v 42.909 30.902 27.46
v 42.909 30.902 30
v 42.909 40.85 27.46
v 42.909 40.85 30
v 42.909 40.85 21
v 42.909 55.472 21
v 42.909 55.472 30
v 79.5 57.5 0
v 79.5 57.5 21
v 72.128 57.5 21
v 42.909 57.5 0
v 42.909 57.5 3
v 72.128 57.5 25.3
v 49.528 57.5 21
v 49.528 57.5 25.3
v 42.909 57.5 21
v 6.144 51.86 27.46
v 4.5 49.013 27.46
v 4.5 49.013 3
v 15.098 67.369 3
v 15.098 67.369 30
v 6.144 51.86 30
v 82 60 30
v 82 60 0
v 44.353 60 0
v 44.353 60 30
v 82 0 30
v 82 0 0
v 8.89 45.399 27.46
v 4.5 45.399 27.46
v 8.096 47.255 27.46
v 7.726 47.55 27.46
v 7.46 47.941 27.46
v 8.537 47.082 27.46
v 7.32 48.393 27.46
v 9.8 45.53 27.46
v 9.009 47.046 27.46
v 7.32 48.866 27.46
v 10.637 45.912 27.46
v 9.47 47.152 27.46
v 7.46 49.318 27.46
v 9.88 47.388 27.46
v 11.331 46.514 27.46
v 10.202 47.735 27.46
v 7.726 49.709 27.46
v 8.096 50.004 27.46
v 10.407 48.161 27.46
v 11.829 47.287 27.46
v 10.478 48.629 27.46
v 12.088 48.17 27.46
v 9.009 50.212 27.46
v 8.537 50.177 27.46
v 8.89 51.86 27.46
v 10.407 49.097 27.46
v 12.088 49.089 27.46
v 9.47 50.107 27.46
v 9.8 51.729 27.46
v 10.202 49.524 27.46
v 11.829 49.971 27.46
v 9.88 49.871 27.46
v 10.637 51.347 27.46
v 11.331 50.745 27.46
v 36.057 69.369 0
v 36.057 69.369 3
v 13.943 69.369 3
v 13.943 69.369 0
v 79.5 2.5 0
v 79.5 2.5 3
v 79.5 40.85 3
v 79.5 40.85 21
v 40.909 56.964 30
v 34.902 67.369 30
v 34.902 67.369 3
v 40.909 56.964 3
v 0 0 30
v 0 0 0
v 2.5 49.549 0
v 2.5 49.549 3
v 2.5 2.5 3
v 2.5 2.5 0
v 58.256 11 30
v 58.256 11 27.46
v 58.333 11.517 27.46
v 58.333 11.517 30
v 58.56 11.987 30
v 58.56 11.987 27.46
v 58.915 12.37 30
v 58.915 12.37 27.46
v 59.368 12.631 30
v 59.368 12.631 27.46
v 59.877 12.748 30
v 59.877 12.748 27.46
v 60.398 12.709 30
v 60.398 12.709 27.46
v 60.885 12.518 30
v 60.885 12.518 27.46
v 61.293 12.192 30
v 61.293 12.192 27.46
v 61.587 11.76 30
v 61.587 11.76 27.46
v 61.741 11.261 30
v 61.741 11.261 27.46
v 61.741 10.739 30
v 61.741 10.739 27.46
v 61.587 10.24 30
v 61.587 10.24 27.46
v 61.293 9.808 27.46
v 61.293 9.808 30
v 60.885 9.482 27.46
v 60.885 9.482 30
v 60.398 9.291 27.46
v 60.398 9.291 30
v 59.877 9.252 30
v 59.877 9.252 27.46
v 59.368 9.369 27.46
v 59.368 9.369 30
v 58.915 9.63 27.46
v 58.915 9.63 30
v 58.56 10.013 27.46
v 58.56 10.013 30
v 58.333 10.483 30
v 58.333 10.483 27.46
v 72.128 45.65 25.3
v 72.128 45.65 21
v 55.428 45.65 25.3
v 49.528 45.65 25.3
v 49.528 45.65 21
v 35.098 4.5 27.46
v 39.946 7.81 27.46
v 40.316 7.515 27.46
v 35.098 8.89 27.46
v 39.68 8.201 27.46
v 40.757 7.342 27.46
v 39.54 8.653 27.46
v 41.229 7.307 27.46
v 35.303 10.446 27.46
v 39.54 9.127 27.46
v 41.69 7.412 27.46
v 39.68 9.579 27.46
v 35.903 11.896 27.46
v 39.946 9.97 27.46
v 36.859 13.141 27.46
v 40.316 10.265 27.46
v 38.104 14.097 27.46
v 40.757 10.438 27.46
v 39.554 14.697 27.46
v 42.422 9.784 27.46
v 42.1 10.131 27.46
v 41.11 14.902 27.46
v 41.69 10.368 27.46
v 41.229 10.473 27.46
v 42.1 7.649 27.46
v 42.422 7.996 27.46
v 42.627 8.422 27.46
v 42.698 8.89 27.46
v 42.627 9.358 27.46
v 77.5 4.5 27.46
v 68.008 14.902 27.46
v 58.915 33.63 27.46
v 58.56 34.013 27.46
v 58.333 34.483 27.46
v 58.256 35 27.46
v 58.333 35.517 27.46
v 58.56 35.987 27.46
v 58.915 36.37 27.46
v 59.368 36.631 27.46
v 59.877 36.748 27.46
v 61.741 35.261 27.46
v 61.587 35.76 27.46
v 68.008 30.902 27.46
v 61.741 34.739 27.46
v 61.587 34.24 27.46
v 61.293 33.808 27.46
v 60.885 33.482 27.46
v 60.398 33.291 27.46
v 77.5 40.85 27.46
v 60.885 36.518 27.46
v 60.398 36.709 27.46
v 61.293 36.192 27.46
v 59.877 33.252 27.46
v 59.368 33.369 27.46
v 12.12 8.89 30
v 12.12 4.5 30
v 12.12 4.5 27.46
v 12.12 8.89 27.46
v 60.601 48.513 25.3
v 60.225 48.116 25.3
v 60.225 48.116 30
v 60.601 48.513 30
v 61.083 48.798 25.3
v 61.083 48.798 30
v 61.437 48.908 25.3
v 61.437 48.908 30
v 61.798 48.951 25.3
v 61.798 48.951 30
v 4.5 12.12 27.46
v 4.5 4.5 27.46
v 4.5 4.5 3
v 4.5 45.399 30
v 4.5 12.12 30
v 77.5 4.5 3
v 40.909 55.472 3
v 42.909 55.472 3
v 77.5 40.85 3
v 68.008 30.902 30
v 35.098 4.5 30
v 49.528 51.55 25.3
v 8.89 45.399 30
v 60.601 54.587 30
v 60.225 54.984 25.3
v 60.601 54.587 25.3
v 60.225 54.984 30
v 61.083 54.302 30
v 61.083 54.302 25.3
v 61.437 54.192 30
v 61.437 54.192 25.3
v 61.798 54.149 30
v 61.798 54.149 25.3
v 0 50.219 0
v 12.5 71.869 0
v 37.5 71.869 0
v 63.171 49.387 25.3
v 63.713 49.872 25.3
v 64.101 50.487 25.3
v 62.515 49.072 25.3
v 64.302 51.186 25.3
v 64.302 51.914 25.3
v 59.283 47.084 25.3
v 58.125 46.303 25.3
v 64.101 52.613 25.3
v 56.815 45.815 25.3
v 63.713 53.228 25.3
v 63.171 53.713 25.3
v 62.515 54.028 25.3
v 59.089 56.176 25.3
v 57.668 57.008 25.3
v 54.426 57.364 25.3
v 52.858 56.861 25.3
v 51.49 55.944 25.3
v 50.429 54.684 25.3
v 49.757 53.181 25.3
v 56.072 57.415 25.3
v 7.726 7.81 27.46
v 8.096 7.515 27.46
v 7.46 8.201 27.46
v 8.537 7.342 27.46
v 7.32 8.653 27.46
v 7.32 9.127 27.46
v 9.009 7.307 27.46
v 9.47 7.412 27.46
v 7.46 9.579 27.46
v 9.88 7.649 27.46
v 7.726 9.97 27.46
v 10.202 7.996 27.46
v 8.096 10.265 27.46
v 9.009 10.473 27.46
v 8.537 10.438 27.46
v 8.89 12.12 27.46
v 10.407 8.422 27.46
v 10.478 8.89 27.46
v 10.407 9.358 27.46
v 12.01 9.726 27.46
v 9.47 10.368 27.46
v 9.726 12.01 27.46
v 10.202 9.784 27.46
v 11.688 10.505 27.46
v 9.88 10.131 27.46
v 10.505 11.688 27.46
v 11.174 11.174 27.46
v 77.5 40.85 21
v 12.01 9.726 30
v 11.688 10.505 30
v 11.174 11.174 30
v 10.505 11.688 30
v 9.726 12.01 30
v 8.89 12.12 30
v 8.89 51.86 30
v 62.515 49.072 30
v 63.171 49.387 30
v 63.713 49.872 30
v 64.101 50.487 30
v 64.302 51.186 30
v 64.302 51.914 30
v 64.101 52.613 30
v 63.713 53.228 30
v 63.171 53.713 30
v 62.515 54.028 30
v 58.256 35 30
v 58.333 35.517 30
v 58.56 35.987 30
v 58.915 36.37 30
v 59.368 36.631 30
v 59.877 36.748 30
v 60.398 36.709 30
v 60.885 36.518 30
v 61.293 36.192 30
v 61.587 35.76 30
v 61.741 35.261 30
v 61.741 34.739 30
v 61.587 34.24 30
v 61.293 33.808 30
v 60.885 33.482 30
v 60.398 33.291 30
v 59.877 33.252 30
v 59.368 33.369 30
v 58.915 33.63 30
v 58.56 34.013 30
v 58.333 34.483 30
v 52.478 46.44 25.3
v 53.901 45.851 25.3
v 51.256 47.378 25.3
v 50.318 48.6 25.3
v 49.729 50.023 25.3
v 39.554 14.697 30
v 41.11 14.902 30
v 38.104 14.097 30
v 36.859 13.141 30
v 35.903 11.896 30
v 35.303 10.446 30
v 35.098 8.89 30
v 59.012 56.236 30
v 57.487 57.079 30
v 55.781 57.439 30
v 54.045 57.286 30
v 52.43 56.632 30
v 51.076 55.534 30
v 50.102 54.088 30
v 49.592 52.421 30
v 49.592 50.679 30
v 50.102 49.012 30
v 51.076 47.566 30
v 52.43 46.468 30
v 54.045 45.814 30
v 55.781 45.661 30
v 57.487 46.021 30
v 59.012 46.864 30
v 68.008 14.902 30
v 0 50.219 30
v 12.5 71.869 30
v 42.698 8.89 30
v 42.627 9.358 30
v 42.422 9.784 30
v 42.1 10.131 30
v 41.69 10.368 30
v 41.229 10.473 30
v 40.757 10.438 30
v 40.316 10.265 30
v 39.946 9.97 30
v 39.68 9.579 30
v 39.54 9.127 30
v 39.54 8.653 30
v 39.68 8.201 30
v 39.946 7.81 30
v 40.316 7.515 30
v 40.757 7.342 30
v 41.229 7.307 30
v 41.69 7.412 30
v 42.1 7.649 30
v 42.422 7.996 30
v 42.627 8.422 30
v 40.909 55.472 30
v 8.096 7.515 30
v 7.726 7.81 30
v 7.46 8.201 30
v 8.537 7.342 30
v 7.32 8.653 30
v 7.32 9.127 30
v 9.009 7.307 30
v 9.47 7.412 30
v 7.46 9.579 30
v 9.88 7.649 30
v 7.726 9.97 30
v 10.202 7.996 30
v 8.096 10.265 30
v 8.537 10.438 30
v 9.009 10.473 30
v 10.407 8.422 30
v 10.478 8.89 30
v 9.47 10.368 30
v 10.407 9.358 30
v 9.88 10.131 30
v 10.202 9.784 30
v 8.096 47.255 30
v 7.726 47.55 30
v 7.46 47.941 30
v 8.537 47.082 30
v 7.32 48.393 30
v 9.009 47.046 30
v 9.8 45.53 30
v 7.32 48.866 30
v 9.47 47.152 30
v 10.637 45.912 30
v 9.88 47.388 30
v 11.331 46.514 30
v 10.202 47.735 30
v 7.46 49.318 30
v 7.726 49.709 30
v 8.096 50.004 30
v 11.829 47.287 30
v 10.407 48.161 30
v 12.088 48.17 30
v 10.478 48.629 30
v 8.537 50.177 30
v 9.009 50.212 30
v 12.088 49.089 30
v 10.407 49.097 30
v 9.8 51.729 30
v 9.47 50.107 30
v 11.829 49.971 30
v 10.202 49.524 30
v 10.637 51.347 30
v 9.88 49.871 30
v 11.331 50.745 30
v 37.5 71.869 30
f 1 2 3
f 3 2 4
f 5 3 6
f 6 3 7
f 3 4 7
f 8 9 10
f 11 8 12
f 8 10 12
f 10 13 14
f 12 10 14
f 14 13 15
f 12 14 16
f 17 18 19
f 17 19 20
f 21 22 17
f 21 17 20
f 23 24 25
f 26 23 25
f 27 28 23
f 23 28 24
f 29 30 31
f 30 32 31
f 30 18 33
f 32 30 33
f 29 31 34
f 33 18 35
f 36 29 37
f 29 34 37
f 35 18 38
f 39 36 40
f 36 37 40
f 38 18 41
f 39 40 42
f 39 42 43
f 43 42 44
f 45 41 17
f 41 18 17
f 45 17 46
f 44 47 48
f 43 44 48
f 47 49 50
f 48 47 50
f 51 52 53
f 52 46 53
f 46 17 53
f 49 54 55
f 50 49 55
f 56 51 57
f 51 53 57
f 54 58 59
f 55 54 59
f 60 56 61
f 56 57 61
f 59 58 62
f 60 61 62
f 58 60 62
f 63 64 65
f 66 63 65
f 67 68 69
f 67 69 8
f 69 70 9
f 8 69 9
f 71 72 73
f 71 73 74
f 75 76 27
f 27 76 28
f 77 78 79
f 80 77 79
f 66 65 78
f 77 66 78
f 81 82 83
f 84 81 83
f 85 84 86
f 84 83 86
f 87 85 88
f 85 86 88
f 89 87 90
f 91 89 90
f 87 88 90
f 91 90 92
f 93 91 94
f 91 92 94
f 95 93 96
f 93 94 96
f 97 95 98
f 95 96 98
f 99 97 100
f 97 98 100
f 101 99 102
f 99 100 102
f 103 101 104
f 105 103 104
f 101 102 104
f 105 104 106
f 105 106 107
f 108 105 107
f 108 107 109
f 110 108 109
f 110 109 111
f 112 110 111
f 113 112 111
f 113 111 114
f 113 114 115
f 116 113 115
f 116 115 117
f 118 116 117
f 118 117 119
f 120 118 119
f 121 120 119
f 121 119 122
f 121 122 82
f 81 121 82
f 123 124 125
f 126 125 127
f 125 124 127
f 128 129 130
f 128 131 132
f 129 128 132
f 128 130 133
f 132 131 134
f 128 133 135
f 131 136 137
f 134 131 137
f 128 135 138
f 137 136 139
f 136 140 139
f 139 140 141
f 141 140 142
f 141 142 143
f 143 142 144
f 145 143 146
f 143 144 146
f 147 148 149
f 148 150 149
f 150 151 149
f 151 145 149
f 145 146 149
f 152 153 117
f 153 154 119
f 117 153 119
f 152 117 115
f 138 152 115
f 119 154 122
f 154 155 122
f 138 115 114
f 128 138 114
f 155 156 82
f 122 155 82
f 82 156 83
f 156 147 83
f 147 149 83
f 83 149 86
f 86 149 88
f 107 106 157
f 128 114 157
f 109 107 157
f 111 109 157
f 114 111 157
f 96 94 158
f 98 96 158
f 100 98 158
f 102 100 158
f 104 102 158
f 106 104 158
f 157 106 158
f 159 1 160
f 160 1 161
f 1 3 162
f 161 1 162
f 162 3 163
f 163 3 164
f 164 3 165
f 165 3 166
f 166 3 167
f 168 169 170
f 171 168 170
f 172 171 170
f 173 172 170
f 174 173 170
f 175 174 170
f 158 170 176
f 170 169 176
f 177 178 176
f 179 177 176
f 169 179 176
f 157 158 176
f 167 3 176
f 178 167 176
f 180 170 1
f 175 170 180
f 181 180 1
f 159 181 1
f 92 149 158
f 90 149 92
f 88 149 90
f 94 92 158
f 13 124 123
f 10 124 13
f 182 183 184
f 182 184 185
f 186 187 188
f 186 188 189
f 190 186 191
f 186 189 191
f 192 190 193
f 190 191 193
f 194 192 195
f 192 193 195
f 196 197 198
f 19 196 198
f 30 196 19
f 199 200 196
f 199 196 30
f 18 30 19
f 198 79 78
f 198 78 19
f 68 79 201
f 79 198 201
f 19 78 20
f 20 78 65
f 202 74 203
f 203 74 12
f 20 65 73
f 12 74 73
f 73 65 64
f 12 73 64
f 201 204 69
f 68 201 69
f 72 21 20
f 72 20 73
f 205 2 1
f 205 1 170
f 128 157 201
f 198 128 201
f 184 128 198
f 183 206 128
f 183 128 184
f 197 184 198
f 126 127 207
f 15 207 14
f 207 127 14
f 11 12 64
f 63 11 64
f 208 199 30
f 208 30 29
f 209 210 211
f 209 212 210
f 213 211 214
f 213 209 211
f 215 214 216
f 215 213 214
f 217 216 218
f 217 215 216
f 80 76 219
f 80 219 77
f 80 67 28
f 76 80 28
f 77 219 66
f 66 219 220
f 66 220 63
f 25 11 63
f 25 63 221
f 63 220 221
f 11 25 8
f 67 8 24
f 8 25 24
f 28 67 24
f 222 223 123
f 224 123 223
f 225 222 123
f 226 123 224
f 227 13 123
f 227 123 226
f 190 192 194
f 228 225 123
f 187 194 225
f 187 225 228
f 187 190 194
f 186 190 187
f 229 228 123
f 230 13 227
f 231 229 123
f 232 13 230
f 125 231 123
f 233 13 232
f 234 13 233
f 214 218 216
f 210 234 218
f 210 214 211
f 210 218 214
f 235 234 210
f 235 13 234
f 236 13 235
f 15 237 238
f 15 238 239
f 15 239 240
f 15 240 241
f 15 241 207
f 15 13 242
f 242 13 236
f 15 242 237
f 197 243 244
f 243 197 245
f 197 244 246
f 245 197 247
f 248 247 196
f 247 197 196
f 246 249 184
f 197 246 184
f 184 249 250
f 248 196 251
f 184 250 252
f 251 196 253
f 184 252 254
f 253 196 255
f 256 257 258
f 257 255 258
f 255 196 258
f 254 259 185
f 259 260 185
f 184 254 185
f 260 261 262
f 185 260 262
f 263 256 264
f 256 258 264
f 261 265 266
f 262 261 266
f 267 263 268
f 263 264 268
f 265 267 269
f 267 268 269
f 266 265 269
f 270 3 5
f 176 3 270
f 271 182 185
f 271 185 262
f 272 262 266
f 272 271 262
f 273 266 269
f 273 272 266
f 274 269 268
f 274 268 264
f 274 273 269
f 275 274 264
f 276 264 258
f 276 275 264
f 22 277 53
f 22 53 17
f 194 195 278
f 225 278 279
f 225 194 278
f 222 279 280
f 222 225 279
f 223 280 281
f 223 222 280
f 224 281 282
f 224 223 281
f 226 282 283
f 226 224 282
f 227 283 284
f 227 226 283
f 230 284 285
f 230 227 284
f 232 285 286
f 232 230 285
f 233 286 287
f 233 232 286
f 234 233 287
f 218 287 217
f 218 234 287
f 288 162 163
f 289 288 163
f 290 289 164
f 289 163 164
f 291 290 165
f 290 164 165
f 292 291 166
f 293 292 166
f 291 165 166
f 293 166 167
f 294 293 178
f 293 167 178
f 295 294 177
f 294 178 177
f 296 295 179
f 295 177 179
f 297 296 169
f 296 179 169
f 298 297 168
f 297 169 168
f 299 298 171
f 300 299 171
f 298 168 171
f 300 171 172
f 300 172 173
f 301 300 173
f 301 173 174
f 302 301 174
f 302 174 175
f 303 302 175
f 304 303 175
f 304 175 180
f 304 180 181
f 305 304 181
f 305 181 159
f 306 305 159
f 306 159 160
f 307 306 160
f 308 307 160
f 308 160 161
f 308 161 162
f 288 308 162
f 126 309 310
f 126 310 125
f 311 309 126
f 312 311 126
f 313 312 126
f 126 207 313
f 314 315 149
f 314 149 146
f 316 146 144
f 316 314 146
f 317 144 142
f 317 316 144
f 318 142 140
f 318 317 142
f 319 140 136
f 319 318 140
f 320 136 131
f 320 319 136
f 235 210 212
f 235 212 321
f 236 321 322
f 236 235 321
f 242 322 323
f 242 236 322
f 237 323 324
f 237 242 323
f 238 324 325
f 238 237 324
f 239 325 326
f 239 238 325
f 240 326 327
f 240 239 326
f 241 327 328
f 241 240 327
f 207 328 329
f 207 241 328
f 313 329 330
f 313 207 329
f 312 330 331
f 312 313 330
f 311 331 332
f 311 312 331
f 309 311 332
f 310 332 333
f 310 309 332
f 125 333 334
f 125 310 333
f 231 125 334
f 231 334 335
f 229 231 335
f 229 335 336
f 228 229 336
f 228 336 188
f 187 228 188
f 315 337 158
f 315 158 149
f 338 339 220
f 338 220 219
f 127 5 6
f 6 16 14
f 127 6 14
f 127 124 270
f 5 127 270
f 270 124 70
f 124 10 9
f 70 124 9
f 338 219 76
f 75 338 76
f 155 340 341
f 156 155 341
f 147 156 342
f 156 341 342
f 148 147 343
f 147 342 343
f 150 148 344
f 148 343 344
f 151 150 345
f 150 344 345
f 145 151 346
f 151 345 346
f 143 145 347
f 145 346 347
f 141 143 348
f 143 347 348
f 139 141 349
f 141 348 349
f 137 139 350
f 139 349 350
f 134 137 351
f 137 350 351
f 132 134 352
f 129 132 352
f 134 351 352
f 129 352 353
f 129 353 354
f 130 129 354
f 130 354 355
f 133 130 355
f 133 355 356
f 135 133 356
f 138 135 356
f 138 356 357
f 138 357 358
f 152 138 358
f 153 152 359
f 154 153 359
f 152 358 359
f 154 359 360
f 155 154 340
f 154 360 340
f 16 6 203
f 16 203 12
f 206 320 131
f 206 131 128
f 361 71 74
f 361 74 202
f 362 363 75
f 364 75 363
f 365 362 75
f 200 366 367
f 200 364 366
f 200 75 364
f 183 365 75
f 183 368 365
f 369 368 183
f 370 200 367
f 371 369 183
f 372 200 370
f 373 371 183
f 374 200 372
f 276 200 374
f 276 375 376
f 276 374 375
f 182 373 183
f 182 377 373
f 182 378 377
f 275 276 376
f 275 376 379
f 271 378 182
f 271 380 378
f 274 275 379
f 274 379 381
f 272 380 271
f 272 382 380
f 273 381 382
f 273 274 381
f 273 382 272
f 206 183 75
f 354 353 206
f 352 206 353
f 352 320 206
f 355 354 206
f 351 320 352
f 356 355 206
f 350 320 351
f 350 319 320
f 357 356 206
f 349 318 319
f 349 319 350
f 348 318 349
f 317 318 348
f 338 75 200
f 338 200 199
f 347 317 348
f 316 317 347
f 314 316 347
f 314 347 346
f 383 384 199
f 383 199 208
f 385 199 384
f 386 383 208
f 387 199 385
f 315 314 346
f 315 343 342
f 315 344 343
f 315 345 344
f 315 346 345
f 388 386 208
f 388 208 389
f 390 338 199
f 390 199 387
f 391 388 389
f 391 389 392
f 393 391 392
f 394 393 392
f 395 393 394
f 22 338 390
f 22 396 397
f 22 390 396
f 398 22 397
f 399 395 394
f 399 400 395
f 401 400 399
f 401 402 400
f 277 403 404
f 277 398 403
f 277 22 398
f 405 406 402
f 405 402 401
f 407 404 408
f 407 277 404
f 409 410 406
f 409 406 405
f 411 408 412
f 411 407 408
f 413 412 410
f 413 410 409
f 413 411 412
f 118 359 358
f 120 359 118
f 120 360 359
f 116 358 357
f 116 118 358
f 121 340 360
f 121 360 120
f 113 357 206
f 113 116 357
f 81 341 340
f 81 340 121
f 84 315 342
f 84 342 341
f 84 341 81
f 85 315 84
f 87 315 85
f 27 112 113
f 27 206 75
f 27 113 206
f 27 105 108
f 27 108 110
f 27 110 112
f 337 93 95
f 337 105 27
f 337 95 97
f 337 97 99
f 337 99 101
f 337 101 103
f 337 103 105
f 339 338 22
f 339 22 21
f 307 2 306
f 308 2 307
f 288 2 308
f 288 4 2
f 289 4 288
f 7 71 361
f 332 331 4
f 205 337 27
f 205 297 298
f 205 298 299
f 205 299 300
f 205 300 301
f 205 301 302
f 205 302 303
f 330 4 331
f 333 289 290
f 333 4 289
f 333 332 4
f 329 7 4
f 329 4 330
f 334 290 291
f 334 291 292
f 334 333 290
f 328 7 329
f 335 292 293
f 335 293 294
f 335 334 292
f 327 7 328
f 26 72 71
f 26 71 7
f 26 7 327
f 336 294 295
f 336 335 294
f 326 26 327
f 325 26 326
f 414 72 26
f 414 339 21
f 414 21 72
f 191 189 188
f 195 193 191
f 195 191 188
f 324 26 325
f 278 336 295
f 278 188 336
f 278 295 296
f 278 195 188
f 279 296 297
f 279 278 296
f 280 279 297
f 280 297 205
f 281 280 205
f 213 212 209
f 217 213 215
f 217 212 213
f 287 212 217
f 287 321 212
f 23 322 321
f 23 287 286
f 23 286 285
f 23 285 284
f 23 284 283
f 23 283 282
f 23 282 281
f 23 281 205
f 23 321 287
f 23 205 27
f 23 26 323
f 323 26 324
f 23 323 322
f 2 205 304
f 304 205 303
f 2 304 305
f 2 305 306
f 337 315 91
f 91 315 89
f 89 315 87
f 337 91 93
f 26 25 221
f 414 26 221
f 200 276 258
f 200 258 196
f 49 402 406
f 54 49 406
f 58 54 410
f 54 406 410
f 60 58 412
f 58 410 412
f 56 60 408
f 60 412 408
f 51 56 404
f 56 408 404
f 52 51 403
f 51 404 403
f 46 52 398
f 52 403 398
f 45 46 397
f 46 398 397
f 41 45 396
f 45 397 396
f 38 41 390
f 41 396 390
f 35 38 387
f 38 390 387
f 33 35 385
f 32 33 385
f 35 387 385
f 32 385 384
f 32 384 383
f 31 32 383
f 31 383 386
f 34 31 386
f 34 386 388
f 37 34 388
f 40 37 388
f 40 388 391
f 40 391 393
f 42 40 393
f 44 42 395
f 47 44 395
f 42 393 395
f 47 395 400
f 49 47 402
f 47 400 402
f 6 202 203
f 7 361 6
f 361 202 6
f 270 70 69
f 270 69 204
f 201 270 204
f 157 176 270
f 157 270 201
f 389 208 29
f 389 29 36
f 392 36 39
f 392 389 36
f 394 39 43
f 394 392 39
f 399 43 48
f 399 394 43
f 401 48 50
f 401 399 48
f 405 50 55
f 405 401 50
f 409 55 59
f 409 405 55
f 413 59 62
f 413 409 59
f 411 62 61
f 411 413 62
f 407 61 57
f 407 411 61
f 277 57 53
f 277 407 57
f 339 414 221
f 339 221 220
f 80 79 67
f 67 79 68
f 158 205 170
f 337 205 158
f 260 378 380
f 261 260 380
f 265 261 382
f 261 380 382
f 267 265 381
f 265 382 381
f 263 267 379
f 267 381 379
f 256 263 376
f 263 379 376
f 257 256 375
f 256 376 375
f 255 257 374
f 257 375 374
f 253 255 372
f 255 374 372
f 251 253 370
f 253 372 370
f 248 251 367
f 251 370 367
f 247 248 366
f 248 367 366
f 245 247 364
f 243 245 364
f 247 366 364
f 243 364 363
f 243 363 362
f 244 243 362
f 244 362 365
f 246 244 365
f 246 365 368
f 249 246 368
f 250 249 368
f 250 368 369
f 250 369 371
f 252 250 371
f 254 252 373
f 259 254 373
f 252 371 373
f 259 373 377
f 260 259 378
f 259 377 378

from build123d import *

# Parameters (mm, degrees)
BOSS_EXTRUDE1_DEPTH = 30
CUT_EXTRUDE1_DEPTH  = 59
SKETCH4_W           = 36.590571665
SKETCH4_H           = 16.65
BOSS_EXTRUDE2_DEPTH = 9
SKETCH5_W           = 22.6
SKETCH5_H           = 11.85
CUT_EXTRUDE2_DEPTH  = 4.3
CUT_EXTRUDE3_DEPTH  = 10.2
BOSS_EXTRUDE3_DEPTH = 27
SKETCH9_R           = 1.5875
BOSS_EXTRUDE5_DEPTH = 2.54
SKETCH11_R          = 1.7526
CUT_EXTRUDE4_DEPTH  = 16
FILLET1_R           = 2


with BuildPart() as part:
    # Sketch1 → Boss-Extrude1 (new body)
    with BuildSketch(Plane.XY):
        Polygon((0, 50.21875), (0, 0), (82, 0), (82, 60), (44.352804008, 60), (37.500008496, 71.86939), (12.500002832, 71.86939), align=None)
    extrude(amount=BOSS_EXTRUDE1_DEPTH)

    # Sketch3 → Cut-Extrude1 (cut)
    with BuildSketch(Plane.XY.offset(30)):
        Polygon((42.909428335, 57.5), (36.056632823, 69.36939), (13.943378505, 69.36939), (2.5, 49.548877019), (2.5, 2.5), (79.5, 2.5), (79.5, 57.5), align=None)
    extrude(amount=-CUT_EXTRUDE1_DEPTH, mode=Mode.SUBTRACT)

    # Sketch4 → Boss-Extrude2 (add)
    with BuildSketch(Plane.XY.offset(30)):
        with Locations((61.204714168, 49.175)):
            Rectangle(SKETCH4_W, SKETCH4_H)
    extrude(amount=-BOSS_EXTRUDE2_DEPTH)

    # Sketch5 → Cut-Extrude2 (cut)
    with BuildSketch(Plane(origin=(0, 0, 21), x_dir=(-1, 0, 0), z_dir=(0, 0, -1))):
        with Locations((-60.82763, 51.575)):
            Rectangle(SKETCH5_W, SKETCH5_H)
    extrude(amount=-CUT_EXTRUDE2_DEPTH, mode=Mode.SUBTRACT)

    # Sketch6 → Cut-Extrude3 (cut)
    with BuildSketch(Plane(origin=(0, 0, 25.3), x_dir=(-1, 0, 0), z_dir=(0, 0, -1))):
        with BuildLine():
            Line((-61.72763, 54.15), (-60.723855071, 54.15))
            ThreePointArc((-60.723855071, 54.15), (-49.52763, 51.55), (-60.723855071, 48.95))
            Line((-60.723855071, 48.95), (-61.72763, 48.95))
            ThreePointArc((-61.72763, 48.95), (-64.32763, 51.55), (-61.72763, 54.15))
        make_face()
    extrude(amount=-CUT_EXTRUDE3_DEPTH, mode=Mode.SUBTRACT)

    # Sketch8 → Boss-Extrude3 (add)
    with BuildSketch(Plane.XY.offset(30)):
        Polygon((13.943378505, 69.36939), (2.5, 49.548877019), (2.5, 2.5), (79.5, 2.5), (79.5, 40.85), (77.5, 40.85), (77.5, 4.5), (4.5, 4.5), (4.5, 49.012978634), (15.098079043, 67.36939), (34.901932285, 67.36939), (40.909428335, 56.964101615), (40.909428335, 55.471773493), (42.909428335, 55.471773493), (42.909428335, 57.5), (36.056632823, 69.36939), align=None)
    extrude(amount=-BOSS_EXTRUDE3_DEPTH)

    # Sketch9 → Boss-Extrude5 (add)
    # profile 1 of 3: a face of its own
    with BuildSketch(Plane.XY.offset(30)):
        with BuildLine():
            Line((4.5, 49.012978634), (4.5, 45.39891))
            Line((4.5, 45.39891), (8.89, 45.39891))
            ThreePointArc((8.89, 45.39891), (12.1205, 48.62941), (8.89, 51.85991))
            Line((8.89, 51.85991), (6.14367659, 51.85991))
            Line((6.14367659, 51.85991), (4.5, 49.012978634))
        make_face()
        with Locations((8.89, 48.62941)):
            Circle(SKETCH9_R, mode=Mode.SUBTRACT)
    # profile 2 of 3: a face of its own
    with BuildSketch(Plane.XY.offset(30)):
        with BuildLine():
            Line((4.5, 4.5), (12.1205, 4.5))
            Line((12.1205, 4.5), (12.1205, 8.89))
            ThreePointArc((12.1205, 8.89), (11.174308457, 11.174308457), (8.89, 12.1205))
            Line((8.89, 12.1205), (4.5, 12.1205))
            Line((4.5, 12.1205), (4.5, 4.5))
        make_face()
        with Locations((8.89, 8.89)):
            Circle(SKETCH9_R, mode=Mode.SUBTRACT)
    # profile 3 of 3: a face of its own
    with BuildSketch(Plane.XY.offset(30)):
        with BuildLine():
            Line((77.5, 4.5), (77.5, 40.85))
            Line((77.5, 40.85), (68.00821278, 40.85))
            Line((68.00821278, 40.85), (42.909428335, 40.85))
            Line((42.909428335, 40.85), (42.909428335, 30.90234))
            Line((42.909428335, 30.90234), (68.00821278, 30.90234))
            Line((68.00821278, 30.90234), (68.00821278, 14.90234))
            Line((68.00821278, 14.90234), (44.3405, 14.90234))
            Line((44.3405, 14.90234), (41.11, 14.90234))
            ThreePointArc((41.11, 14.90234), (36.858633615, 13.141366385), (35.09766, 8.89))
            Line((35.09766, 8.89), (35.09766, 4.5))
            Line((35.09766, 4.5), (44.3405, 4.5))
            Line((44.3405, 4.5), (68.00821278, 4.5))
            Line((68.00821278, 4.5), (77.5, 4.5))
        make_face()
        with Locations((41.11, 8.89)):
            Circle(SKETCH9_R, mode=Mode.SUBTRACT)
    extrude(amount=-BOSS_EXTRUDE5_DEPTH)

    # Sketch11 → Cut-Extrude4 (cut)
    with BuildSketch(Plane(origin=(0, 0, 27.46), x_dir=(-1, 0, 0), z_dir=(0, 0, -1))):
        with Locations((-60.00821, 35)):
            Circle(SKETCH11_R)
        with Locations((-60.00821, 11)):
            Circle(SKETCH11_R)
    extrude(amount=-CUT_EXTRUDE4_DEPTH, mode=Mode.SUBTRACT)

    # Fillet1
    fillet1_edges = [part.edges().sort_by_distance(p)[0] for p in [
        (60.723855071, 48.95, 27.65),
        (60.723855071, 54.15, 27.65),
    ]]
    fillet(fillet1_edges, radius=FILLET1_R)


solid = part.part
